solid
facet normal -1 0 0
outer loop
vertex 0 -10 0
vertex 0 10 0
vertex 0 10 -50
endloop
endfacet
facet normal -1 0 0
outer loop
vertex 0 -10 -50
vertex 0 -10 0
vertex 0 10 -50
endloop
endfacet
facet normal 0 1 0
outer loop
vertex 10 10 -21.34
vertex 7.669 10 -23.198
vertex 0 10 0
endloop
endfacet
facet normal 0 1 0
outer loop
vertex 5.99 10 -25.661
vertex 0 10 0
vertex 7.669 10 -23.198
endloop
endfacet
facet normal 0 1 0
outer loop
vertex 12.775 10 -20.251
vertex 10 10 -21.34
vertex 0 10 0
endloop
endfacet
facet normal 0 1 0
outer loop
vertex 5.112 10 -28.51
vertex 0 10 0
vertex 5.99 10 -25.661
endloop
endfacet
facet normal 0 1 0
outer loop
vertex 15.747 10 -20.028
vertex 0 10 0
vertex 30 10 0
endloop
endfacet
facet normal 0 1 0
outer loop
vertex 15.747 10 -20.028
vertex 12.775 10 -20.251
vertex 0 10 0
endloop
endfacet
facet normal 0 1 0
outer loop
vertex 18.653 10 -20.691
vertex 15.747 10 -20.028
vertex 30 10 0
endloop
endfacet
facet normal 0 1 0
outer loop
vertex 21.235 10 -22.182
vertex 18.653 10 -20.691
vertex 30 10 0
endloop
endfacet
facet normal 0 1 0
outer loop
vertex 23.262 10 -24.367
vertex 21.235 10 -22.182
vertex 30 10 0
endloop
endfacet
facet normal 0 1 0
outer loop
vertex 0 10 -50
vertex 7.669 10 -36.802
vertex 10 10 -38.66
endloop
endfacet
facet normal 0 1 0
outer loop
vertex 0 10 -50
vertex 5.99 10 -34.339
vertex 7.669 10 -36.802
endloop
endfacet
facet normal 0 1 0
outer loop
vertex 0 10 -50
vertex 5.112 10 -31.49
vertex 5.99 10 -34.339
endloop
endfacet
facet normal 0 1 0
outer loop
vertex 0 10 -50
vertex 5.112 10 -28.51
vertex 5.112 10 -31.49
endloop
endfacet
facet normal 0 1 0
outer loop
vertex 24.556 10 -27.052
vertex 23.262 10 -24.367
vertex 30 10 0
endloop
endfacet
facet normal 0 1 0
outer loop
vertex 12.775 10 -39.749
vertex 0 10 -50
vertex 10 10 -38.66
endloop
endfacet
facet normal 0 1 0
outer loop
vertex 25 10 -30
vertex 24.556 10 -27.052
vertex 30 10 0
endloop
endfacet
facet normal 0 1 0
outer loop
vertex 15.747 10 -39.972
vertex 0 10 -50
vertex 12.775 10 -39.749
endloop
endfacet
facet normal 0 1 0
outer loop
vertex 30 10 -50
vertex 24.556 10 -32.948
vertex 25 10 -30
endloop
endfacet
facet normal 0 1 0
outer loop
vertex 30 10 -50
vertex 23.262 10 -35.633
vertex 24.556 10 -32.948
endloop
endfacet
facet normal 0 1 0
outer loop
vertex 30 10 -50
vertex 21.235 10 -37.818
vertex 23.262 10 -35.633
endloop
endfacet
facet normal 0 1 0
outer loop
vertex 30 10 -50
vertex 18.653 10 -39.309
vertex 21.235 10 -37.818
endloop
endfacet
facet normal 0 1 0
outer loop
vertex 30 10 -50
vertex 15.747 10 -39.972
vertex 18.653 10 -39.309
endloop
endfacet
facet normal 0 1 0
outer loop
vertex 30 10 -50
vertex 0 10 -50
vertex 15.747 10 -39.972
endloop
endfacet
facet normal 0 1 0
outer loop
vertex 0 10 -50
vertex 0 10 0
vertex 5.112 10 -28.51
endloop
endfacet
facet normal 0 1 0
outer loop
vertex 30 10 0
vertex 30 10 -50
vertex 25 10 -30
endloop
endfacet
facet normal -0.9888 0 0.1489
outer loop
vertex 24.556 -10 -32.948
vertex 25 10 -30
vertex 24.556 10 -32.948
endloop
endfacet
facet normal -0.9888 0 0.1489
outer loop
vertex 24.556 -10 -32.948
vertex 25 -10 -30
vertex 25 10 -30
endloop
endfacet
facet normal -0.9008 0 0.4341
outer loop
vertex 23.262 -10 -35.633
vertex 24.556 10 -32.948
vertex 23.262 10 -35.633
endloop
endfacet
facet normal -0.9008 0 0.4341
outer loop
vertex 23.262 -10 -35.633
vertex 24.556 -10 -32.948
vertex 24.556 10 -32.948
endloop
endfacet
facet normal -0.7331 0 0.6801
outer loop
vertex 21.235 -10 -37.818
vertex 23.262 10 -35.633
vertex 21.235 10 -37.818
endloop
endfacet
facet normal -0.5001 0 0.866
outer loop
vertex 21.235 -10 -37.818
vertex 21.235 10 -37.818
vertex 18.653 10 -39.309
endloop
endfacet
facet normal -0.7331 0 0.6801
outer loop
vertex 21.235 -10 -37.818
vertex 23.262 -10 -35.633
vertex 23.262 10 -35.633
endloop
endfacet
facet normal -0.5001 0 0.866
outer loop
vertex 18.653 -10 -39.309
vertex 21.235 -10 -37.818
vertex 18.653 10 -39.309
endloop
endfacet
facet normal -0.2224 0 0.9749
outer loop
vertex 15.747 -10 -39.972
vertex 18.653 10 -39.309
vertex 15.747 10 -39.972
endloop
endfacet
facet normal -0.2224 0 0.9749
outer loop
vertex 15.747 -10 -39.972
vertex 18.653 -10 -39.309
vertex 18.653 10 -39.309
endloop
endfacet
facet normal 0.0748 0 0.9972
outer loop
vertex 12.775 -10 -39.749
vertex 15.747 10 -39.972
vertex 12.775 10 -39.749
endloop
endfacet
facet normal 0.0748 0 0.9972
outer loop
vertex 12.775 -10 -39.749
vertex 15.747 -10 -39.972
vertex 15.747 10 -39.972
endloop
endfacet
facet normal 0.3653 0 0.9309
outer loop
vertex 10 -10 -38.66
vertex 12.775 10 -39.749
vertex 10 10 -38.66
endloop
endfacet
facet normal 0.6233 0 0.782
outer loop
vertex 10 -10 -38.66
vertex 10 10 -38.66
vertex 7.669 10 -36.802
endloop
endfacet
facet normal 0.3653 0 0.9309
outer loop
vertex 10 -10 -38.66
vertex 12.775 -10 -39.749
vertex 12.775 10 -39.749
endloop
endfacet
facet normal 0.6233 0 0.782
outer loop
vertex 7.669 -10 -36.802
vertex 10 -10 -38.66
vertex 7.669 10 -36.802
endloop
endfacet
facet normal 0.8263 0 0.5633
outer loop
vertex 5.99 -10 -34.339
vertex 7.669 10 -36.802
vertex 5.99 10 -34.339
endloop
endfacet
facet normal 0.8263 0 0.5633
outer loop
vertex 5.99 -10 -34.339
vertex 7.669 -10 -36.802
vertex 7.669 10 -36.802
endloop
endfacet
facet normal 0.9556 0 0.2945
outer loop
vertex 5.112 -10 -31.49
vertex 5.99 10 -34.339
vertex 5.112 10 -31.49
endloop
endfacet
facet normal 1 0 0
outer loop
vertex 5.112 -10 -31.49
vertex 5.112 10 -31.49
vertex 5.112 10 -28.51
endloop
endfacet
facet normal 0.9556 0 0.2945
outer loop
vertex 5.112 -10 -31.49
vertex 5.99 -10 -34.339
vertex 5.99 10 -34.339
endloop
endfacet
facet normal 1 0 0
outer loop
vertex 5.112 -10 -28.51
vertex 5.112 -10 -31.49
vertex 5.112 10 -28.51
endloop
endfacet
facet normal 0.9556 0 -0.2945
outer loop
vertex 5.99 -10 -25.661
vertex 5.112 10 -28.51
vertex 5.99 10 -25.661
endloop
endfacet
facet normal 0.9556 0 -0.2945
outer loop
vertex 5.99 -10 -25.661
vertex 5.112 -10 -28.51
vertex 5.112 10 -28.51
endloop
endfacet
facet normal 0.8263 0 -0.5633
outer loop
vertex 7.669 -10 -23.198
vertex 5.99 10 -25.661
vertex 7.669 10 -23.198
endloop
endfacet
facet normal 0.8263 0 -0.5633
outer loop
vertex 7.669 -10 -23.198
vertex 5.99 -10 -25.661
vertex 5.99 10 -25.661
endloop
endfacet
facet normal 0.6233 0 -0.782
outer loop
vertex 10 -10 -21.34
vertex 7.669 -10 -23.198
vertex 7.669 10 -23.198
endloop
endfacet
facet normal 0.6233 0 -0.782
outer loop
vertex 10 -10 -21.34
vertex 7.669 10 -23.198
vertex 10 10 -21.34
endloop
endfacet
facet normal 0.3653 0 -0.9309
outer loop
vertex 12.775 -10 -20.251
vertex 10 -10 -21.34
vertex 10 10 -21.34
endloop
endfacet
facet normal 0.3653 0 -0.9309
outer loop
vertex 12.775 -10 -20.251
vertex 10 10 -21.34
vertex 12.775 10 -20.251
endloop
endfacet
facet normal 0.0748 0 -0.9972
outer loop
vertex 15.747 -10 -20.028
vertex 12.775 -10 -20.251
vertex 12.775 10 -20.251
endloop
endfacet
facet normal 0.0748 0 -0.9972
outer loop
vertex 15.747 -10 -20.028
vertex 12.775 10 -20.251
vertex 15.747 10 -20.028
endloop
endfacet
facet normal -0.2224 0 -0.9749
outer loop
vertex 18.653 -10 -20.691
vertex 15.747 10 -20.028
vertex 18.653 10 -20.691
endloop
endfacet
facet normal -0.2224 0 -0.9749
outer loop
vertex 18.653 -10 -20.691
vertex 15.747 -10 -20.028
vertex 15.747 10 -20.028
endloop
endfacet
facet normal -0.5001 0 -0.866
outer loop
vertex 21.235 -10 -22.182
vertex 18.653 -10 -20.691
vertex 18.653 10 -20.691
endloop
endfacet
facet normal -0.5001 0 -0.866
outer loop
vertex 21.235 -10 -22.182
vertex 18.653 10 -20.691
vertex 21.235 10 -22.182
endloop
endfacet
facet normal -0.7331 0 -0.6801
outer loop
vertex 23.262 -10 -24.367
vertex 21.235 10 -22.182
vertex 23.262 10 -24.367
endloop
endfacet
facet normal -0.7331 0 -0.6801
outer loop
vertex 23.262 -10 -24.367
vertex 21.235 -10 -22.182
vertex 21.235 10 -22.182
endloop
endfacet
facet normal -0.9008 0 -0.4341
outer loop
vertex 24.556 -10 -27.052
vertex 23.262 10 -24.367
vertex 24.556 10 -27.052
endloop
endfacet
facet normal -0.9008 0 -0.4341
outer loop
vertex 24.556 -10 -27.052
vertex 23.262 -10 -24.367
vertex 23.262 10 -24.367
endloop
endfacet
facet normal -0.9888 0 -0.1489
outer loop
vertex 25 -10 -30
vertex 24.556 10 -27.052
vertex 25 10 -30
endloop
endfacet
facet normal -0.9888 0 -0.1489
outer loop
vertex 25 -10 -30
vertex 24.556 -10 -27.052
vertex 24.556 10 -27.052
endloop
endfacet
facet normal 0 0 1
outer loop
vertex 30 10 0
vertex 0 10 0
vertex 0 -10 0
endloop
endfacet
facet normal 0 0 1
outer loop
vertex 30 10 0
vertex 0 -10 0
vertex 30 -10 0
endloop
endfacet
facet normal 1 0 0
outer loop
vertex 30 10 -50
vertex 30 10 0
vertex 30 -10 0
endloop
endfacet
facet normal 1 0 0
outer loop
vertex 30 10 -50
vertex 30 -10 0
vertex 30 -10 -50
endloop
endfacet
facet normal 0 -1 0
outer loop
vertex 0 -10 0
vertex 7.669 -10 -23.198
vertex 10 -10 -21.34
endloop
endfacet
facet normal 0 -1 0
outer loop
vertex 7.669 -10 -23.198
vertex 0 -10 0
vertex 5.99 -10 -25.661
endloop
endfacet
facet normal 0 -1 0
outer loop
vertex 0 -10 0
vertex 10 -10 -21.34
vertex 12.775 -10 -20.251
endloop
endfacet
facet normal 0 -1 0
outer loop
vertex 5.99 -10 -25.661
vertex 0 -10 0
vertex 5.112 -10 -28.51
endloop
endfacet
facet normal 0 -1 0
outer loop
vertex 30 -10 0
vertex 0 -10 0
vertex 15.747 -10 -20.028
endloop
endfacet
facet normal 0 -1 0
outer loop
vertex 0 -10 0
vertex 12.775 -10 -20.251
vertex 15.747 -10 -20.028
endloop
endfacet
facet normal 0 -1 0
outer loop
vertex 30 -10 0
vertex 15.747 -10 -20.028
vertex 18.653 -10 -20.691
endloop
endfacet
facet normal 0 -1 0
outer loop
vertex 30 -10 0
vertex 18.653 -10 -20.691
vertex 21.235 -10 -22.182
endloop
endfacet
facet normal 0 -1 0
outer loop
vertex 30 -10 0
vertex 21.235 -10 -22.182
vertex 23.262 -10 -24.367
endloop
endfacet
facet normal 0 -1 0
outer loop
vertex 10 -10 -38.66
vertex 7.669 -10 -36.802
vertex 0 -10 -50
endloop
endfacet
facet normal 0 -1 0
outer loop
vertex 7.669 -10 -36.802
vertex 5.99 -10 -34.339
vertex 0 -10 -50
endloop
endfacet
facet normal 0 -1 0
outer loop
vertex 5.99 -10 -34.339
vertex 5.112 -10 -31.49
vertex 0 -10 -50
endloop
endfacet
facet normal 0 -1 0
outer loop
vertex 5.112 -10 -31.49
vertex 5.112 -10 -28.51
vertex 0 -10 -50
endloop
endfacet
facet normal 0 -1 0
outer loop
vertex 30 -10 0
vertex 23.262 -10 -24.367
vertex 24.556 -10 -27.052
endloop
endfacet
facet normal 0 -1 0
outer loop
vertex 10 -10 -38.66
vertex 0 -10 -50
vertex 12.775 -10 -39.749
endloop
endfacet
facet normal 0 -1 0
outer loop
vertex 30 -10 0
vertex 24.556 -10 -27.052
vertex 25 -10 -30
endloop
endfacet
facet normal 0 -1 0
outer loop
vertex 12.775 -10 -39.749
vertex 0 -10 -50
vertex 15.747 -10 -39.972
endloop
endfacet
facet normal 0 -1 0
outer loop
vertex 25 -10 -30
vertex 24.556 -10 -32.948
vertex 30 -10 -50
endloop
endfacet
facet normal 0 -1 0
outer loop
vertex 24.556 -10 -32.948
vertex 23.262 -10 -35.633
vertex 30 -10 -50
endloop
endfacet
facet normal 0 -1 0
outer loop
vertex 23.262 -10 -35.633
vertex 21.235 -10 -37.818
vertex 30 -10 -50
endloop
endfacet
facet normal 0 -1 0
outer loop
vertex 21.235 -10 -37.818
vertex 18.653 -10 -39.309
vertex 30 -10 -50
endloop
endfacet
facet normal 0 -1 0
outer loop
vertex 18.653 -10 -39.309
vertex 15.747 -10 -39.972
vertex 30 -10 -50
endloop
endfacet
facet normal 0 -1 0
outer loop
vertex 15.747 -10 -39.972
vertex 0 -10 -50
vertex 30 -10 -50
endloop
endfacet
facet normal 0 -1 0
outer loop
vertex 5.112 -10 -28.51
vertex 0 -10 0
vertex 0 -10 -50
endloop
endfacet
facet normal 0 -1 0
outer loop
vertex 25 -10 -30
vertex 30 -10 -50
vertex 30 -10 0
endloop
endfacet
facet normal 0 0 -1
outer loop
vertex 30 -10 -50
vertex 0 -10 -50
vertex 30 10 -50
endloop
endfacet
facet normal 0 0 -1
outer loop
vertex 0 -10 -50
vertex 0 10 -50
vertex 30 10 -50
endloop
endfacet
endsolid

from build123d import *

# Parameters (mm, degrees)
SKETCH1_W           = 30
SKETCH1_H           = 50
SKETCH1_R           = 10
BOSS_EXTRUDE1_DEPTH = 10


with BuildPart() as part:
    # Sketch1 → Boss-Extrude1 (new body, symmetric)
    with BuildSketch(Plane(origin=(0, 0, 0), x_dir=(1, 0, 0), z_dir=(0, 1, 0))):
        with Locations((15, 25)):
            Rectangle(SKETCH1_W, SKETCH1_H)
        with Locations((15, 30)):
            Circle(SKETCH1_R, mode=Mode.SUBTRACT)
    extrude(amount=BOSS_EXTRUDE1_DEPTH, both=True)


solid = part.part
